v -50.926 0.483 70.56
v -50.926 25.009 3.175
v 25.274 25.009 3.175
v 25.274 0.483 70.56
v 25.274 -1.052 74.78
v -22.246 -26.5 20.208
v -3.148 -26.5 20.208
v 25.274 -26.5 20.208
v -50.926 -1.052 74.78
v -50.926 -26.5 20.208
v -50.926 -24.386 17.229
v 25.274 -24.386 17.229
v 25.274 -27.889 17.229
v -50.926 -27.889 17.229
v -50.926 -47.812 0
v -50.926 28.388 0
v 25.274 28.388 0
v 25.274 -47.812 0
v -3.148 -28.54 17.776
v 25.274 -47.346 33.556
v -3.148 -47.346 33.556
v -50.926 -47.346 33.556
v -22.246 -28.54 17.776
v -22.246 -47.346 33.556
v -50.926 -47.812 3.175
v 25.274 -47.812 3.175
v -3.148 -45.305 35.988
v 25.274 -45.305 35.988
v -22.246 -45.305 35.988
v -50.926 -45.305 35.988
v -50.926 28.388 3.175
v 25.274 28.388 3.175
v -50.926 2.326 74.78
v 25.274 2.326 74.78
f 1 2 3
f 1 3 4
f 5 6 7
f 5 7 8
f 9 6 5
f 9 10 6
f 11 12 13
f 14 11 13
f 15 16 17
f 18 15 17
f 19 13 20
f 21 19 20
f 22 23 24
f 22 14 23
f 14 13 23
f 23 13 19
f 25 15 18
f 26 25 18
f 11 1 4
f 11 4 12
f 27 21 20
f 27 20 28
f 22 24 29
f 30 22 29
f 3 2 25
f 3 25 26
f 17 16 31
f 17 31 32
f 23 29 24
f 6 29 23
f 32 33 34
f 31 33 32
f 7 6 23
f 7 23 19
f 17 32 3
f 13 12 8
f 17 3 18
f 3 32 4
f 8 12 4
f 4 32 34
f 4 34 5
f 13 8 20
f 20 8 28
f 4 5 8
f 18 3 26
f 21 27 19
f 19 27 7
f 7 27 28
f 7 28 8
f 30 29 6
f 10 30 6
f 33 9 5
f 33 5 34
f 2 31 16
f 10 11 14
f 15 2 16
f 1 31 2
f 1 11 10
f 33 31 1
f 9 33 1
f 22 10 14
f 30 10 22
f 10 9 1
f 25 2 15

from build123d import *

# Parameters (mm, degrees)
F0_W     = 76.2
F0_H     = 76.2
F1_DEPTH = 3.175
F3_DEPTH = 76.2
F4_W     = 19.098544
F4_H     = 24.549261
F5_DEPTH = 4


with BuildPart() as f1:
    # F0 (on Top) → F1 (new body)
    with BuildSketch(Plane.XY):
        with Locations((-12.826032, -9.711786)):
            Rectangle(F0_W, F0_H)
    extrude(amount=F1_DEPTH)

    # F2 (on face) → F3 (join)
    with BuildSketch(Plane(origin=(-50.926032, 0, 0), x_dir=(0, -1, 0), z_dir=(-1, 0, 0))):
        Polygon((1.052486, 74.779578), (-0.483229, 70.560237), (24.38552, 17.229033), (27.888745, 17.229033), (26.499598, 20.208069), align=None)
        Polygon((45.305423, 35.98803), (26.499598, 20.208069), (27.888745, 17.229033), (47.346274, 33.555839), align=None)
        Polygon((-2.326279, 74.779578), (-28.388214, 3.175), (-25.009449, 3.175), (-0.483229, 70.560237), (1.052486, 74.779578), align=None)
    extrude(amount=-F3_DEPTH)

    # F4 (on face) → F5 (cut)
    with BuildSketch(Plane(origin=(0, -0.998464, -1.189923), x_dir=(1, 0, 0), z_dir=(0, 0.642788, 0.766044))):
        with Locations((-12.696923, -45.563997)):
            Rectangle(F4_W, F4_H)
    extrude(amount=-F5_DEPTH, mode=Mode.SUBTRACT)


solid = f1.part
